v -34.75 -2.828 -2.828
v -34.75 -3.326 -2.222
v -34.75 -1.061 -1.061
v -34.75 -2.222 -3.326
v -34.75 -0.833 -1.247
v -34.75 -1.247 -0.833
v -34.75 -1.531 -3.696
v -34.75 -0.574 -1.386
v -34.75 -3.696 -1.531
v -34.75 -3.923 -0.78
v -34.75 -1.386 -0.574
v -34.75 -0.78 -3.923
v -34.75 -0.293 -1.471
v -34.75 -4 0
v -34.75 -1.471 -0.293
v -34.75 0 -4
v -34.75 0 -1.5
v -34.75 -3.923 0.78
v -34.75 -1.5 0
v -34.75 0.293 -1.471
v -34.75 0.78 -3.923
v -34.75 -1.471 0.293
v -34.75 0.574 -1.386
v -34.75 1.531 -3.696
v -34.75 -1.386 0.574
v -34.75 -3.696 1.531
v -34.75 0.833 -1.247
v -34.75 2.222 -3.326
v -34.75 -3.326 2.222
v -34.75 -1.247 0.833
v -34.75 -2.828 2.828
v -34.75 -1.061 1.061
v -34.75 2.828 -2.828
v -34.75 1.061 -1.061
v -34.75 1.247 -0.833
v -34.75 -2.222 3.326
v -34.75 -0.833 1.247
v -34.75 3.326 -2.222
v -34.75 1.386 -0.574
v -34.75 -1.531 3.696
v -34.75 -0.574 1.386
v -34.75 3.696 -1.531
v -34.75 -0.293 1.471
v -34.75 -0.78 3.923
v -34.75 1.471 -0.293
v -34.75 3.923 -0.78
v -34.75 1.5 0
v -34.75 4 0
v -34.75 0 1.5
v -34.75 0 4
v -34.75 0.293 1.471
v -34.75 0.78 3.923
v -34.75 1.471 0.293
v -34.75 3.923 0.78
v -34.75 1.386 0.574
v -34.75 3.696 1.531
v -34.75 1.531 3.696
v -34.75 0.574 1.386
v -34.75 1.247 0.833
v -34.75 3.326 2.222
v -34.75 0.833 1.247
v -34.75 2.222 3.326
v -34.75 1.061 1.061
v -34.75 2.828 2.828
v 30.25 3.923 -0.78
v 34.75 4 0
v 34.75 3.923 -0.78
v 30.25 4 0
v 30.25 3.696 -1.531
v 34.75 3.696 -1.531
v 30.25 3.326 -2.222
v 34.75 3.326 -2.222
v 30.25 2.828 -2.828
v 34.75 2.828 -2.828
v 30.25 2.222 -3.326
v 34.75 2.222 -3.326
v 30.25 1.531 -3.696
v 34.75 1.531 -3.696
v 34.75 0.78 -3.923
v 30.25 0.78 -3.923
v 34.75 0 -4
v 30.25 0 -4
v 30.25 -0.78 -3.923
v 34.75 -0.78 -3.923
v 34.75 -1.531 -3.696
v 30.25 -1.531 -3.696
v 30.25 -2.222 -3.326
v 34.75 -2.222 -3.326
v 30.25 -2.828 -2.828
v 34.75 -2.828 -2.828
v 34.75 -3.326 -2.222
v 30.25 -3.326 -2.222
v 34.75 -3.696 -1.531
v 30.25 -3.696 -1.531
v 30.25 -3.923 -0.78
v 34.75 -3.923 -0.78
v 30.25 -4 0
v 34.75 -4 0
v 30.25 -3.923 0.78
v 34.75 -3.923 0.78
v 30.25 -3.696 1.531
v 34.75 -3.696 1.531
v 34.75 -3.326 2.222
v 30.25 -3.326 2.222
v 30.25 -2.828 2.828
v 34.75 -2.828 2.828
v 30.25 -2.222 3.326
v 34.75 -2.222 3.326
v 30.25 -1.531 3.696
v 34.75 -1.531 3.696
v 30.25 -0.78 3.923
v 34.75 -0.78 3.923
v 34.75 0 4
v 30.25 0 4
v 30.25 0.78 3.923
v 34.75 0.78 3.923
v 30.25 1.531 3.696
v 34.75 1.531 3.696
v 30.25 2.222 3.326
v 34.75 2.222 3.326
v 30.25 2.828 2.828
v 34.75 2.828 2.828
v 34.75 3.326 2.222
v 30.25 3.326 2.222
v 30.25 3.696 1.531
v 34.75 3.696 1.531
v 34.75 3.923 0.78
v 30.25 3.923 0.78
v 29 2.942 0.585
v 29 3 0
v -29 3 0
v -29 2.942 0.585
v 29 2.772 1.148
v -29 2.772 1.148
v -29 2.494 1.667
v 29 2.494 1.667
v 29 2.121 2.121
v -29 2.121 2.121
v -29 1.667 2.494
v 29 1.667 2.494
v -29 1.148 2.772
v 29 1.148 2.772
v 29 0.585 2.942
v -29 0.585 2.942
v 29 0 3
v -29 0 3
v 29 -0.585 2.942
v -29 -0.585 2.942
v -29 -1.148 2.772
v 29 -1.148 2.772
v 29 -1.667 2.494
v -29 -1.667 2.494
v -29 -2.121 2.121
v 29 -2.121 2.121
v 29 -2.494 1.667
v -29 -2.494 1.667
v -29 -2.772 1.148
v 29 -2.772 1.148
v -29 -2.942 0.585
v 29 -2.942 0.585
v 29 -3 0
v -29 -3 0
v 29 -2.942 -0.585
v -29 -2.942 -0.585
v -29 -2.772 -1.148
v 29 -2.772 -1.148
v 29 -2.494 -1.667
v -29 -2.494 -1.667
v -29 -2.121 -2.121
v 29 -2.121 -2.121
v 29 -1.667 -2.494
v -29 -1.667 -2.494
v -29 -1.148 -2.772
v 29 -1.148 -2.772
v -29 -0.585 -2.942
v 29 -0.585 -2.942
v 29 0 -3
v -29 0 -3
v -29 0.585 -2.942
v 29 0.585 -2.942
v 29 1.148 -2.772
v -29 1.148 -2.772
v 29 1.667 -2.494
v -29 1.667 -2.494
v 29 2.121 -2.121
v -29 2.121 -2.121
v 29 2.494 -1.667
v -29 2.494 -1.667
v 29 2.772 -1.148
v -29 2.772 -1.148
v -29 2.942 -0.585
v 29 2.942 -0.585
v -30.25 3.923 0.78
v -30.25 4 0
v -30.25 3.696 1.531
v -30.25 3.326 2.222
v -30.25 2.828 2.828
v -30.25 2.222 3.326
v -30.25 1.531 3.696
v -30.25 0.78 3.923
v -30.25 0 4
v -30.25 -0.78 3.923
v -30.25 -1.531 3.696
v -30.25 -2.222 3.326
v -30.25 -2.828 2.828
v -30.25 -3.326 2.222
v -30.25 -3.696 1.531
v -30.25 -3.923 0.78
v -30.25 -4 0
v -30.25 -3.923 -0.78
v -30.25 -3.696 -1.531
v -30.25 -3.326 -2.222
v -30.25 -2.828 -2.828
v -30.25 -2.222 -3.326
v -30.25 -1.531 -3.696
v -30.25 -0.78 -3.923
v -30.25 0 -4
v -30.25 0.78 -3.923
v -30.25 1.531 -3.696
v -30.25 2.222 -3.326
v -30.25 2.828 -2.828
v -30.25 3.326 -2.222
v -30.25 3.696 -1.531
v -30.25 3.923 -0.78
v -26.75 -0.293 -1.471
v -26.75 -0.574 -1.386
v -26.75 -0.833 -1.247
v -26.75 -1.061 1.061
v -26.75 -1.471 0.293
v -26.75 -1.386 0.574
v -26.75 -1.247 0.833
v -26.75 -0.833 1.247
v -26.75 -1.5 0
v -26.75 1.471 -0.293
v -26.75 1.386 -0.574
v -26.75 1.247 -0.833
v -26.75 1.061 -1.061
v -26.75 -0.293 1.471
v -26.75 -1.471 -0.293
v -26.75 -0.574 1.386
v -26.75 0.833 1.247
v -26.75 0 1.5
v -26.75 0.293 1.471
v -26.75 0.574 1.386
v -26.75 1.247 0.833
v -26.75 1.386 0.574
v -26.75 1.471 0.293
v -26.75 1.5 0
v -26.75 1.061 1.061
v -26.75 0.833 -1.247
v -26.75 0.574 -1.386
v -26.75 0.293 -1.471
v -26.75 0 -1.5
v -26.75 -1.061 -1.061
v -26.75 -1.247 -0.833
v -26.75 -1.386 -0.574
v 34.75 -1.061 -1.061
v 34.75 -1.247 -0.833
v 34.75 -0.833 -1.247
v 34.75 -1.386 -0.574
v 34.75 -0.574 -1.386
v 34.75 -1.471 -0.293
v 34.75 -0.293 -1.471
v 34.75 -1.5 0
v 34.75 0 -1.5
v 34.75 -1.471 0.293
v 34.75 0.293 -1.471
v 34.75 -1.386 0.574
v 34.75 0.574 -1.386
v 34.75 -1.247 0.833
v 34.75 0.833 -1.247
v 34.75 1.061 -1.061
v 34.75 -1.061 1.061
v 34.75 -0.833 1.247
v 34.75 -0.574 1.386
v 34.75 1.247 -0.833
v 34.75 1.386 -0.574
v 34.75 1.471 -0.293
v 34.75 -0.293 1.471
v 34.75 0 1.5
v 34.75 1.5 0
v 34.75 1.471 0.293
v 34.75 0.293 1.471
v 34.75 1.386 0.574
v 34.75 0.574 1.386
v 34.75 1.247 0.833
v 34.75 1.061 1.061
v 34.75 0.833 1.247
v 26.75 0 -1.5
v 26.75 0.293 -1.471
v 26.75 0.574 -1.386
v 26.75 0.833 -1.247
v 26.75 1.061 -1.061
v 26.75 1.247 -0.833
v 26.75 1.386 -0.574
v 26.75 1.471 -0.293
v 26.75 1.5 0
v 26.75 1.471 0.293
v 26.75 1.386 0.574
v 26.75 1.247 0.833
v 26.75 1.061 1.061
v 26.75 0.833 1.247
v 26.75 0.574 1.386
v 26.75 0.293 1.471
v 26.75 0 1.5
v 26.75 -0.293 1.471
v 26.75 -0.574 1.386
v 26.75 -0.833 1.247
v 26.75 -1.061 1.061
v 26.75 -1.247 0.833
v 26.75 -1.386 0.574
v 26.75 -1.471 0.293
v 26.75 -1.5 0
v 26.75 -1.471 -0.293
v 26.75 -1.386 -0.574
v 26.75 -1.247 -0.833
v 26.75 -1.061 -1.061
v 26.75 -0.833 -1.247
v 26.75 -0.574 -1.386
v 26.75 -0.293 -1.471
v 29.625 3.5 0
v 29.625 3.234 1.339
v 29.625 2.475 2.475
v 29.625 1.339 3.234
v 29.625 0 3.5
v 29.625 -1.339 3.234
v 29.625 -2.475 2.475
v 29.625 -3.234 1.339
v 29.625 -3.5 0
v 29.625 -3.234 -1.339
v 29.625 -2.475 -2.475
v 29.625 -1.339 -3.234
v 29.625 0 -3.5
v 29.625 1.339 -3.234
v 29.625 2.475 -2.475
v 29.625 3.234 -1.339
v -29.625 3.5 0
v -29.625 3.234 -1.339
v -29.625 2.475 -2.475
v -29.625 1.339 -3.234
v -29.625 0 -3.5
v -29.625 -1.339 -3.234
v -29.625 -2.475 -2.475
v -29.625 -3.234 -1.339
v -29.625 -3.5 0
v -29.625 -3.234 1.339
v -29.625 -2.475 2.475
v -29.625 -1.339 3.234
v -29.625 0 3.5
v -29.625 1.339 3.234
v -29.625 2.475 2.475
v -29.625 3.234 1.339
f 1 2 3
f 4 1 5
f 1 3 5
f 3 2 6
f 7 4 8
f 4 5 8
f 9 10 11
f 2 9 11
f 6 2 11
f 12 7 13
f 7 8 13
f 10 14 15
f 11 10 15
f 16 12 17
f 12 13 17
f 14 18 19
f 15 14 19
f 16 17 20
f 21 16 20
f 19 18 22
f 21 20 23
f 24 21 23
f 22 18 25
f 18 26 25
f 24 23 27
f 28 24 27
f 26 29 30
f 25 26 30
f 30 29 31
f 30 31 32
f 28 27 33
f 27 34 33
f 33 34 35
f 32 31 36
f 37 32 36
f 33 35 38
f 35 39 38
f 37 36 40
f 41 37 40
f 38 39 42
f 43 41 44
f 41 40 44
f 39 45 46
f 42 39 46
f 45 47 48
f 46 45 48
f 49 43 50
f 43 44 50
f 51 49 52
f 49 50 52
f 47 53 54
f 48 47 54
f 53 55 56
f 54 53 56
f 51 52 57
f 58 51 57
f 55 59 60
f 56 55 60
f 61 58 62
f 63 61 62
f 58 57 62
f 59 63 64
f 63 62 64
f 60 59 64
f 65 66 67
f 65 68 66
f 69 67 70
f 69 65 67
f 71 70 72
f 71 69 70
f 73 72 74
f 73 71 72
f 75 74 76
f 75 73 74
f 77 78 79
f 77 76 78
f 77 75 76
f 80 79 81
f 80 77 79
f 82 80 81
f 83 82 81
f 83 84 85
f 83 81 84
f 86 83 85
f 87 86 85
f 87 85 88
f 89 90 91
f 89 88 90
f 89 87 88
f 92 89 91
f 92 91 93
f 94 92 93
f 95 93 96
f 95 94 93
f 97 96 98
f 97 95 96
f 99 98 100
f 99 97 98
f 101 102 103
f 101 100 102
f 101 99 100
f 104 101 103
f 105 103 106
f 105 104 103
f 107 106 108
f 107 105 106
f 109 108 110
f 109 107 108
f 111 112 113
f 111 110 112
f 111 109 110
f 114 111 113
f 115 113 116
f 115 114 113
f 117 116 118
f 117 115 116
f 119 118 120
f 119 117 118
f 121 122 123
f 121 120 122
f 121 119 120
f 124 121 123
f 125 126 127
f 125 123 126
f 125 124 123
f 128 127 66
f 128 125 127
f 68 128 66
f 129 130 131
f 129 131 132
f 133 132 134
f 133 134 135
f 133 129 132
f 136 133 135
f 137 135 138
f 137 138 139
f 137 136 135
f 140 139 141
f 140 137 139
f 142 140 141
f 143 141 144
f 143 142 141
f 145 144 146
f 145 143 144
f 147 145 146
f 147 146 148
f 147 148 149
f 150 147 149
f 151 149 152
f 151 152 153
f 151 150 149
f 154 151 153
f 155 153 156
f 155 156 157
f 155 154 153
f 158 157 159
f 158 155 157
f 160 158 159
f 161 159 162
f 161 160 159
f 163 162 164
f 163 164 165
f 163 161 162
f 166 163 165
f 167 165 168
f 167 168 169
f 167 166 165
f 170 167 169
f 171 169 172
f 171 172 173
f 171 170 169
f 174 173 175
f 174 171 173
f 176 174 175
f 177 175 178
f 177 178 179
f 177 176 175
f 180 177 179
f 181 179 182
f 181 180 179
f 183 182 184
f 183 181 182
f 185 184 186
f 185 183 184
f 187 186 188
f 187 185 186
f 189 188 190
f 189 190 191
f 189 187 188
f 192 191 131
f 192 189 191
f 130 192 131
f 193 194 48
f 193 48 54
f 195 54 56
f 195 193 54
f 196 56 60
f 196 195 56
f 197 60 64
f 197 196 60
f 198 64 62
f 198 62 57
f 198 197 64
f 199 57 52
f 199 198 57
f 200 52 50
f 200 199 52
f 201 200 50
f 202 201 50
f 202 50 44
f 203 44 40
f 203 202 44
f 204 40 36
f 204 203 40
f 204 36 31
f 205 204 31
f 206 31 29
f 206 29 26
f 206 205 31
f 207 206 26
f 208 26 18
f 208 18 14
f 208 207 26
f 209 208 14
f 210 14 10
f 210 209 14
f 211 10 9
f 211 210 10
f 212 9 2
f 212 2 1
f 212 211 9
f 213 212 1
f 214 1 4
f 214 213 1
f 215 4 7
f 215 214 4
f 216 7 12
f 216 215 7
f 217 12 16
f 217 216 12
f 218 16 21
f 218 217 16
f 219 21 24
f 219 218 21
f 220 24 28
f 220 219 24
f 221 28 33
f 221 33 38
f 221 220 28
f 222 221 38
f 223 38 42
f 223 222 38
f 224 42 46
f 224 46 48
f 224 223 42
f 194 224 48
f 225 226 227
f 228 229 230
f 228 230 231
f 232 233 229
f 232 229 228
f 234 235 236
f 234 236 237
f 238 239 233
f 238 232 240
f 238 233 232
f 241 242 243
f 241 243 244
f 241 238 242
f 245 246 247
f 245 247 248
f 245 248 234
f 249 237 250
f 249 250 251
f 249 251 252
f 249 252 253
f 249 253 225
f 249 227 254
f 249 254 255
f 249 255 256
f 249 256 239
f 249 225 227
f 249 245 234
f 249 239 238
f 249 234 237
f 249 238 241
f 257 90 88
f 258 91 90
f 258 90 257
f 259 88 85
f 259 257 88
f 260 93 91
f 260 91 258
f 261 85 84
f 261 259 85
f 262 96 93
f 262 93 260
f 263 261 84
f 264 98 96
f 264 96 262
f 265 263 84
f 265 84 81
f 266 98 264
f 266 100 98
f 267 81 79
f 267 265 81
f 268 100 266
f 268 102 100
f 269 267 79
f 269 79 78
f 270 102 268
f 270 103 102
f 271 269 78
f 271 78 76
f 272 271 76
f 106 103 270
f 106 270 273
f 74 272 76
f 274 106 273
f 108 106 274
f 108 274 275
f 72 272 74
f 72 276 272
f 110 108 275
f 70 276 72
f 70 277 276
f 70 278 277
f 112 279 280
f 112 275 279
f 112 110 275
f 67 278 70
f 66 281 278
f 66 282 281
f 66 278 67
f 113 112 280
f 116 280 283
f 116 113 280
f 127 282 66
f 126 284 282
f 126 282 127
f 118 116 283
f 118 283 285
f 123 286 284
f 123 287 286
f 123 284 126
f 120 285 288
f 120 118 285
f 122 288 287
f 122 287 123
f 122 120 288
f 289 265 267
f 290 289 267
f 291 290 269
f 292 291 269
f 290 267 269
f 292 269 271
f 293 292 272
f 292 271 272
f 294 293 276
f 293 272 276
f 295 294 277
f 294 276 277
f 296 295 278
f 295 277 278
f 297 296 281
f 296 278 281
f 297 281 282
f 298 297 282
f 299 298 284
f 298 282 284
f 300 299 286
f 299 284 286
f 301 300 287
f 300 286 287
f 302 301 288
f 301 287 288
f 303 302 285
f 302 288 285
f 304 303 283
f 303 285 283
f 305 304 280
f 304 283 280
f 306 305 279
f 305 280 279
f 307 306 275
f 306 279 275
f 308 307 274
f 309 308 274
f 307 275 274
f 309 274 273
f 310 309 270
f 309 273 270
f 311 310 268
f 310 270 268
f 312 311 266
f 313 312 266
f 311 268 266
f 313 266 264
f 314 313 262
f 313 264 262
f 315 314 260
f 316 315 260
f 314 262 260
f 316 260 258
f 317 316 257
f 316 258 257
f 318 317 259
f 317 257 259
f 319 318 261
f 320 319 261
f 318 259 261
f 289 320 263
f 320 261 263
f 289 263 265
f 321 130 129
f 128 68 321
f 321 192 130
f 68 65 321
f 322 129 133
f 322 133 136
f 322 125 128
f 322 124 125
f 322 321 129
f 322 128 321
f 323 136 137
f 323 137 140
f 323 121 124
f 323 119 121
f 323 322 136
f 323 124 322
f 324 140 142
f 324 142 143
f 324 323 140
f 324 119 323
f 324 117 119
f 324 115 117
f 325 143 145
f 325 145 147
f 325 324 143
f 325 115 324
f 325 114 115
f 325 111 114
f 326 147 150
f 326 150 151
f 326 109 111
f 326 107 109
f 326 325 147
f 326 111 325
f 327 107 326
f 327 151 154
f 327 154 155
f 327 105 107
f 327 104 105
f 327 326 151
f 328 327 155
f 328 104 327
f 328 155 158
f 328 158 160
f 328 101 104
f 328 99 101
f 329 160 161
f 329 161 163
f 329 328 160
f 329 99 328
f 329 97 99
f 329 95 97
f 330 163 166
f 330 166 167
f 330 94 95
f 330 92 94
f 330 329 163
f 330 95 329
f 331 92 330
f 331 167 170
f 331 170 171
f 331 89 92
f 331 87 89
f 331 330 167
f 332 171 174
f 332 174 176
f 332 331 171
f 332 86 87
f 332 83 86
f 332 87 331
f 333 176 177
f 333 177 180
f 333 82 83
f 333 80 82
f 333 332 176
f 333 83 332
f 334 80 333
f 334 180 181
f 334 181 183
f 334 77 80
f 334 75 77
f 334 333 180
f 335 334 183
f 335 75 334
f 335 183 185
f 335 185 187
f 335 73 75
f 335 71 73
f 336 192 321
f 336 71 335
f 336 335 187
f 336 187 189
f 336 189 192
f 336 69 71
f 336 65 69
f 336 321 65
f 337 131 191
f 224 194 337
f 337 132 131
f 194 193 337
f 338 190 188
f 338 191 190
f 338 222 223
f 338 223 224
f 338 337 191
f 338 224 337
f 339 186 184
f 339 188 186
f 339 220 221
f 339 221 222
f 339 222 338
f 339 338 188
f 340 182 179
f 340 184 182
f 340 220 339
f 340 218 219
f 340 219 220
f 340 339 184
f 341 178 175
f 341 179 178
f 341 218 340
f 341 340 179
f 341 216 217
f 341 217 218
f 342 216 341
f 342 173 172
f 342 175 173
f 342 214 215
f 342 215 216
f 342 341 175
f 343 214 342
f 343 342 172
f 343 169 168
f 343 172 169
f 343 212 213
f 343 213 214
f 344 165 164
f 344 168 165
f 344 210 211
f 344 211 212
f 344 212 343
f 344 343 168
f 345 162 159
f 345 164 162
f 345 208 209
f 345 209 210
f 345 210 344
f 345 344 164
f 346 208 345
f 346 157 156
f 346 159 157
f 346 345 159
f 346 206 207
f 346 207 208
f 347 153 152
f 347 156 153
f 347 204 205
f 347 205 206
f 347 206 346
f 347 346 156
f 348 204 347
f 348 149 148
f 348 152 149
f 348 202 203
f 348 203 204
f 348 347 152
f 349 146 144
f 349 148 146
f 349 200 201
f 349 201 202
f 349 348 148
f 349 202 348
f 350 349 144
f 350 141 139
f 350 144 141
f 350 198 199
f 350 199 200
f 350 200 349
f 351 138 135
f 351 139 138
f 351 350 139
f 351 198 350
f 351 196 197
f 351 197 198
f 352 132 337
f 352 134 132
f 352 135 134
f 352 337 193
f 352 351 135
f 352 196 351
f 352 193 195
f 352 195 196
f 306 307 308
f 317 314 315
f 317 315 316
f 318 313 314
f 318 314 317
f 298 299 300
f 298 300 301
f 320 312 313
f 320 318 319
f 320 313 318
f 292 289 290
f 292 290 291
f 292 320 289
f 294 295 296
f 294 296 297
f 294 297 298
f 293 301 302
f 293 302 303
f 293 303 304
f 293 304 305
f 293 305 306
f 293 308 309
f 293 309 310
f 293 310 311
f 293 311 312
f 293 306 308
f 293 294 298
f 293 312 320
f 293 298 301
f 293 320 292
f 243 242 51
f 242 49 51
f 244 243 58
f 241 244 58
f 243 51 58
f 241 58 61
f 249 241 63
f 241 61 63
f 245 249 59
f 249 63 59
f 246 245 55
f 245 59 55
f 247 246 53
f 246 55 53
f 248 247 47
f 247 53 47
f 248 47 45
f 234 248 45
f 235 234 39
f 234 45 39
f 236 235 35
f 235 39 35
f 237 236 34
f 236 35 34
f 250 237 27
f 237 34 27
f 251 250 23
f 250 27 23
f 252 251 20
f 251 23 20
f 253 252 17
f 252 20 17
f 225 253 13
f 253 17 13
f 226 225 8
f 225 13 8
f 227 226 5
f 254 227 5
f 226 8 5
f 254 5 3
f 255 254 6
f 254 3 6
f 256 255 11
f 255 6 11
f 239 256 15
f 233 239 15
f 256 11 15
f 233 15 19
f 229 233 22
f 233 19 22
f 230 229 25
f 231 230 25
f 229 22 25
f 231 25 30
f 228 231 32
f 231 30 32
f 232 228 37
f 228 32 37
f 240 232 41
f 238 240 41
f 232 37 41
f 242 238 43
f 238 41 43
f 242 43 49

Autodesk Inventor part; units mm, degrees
ref_plane "YZ Plane" through (0, 0, 0) normal (1, 0, 0) x (0, 1, 0)
ref_plane "XZ Plane" through (0, 0, 0) normal (0, 1, 0) x (-1, 0, 0)
ref_plane "XY Plane" through (0, 0, 0) normal (0, 0, 1) x (1, 0, 0)
sketch "Sketch1" plane through (0, 0, 0) normal (0, 0, 1) x (1, 0, 0)
  line L0 (-34.75, 0) -> (34.75, 0)
  line L1 (-34.75, 0) -> (-34.75, 4)
  line L2 (-34.75, 4) -> (-30.25, 4)
  line L3 (34.75, 0) -> (34.75, 4)
  line L4 (34.75, 4) -> (30.25, 4)
  line L5 (-29, 3) -> (29, 3)
  line L6 (-30.25, 4) -> (-29, 3)
  line L7 (30.25, 4) -> (29, 3)
  point P0 (0, 0)
  dimension "d0" = 69.5
  dimension "d1" = 0
  dimension "d2" = 34.75
  dimension "d3" = 4
  dimension "d4" = 4.5
  dimension "d5" = 4
  dimension "d6" = 4.5
  dimension "d7" = 58
  dimension "d8" = 3
  dimension "d9" = 29
revolve "Revolution1" add sketch "Sketch1" angle 360 about axis through (-34.75, 0, 0) along (1, 0, 0)
sketch "Sketch2" plane through (34.75, 0, 0) normal (1, 0, 0) x (0, 0, -1)
  circle A0 centre (0, 0) radius 1.5
  dimension "d11" = 3
extrude "Extrusion1" cut sketch "Sketch2" against normal blind 8
thread "Thread1" size "M3x0.5" class "6H" standard "ANSI Metric M Profile" full length
sketch "Sketch3" plane through (-34.75, 0, 0) normal (-1, 0, 0) x (0, 0, 1)
  circle A0 centre (0, 0) radius 1.5
  dimension "d16" = 3
extrude "Extrusion2" cut sketch "Sketch3" against normal blind 8
thread "Thread2" size "M3x0.5" class "6H" standard "ANSI Metric M Profile" full length
properties part number "RCT-H010_Al_side_plate_post"
